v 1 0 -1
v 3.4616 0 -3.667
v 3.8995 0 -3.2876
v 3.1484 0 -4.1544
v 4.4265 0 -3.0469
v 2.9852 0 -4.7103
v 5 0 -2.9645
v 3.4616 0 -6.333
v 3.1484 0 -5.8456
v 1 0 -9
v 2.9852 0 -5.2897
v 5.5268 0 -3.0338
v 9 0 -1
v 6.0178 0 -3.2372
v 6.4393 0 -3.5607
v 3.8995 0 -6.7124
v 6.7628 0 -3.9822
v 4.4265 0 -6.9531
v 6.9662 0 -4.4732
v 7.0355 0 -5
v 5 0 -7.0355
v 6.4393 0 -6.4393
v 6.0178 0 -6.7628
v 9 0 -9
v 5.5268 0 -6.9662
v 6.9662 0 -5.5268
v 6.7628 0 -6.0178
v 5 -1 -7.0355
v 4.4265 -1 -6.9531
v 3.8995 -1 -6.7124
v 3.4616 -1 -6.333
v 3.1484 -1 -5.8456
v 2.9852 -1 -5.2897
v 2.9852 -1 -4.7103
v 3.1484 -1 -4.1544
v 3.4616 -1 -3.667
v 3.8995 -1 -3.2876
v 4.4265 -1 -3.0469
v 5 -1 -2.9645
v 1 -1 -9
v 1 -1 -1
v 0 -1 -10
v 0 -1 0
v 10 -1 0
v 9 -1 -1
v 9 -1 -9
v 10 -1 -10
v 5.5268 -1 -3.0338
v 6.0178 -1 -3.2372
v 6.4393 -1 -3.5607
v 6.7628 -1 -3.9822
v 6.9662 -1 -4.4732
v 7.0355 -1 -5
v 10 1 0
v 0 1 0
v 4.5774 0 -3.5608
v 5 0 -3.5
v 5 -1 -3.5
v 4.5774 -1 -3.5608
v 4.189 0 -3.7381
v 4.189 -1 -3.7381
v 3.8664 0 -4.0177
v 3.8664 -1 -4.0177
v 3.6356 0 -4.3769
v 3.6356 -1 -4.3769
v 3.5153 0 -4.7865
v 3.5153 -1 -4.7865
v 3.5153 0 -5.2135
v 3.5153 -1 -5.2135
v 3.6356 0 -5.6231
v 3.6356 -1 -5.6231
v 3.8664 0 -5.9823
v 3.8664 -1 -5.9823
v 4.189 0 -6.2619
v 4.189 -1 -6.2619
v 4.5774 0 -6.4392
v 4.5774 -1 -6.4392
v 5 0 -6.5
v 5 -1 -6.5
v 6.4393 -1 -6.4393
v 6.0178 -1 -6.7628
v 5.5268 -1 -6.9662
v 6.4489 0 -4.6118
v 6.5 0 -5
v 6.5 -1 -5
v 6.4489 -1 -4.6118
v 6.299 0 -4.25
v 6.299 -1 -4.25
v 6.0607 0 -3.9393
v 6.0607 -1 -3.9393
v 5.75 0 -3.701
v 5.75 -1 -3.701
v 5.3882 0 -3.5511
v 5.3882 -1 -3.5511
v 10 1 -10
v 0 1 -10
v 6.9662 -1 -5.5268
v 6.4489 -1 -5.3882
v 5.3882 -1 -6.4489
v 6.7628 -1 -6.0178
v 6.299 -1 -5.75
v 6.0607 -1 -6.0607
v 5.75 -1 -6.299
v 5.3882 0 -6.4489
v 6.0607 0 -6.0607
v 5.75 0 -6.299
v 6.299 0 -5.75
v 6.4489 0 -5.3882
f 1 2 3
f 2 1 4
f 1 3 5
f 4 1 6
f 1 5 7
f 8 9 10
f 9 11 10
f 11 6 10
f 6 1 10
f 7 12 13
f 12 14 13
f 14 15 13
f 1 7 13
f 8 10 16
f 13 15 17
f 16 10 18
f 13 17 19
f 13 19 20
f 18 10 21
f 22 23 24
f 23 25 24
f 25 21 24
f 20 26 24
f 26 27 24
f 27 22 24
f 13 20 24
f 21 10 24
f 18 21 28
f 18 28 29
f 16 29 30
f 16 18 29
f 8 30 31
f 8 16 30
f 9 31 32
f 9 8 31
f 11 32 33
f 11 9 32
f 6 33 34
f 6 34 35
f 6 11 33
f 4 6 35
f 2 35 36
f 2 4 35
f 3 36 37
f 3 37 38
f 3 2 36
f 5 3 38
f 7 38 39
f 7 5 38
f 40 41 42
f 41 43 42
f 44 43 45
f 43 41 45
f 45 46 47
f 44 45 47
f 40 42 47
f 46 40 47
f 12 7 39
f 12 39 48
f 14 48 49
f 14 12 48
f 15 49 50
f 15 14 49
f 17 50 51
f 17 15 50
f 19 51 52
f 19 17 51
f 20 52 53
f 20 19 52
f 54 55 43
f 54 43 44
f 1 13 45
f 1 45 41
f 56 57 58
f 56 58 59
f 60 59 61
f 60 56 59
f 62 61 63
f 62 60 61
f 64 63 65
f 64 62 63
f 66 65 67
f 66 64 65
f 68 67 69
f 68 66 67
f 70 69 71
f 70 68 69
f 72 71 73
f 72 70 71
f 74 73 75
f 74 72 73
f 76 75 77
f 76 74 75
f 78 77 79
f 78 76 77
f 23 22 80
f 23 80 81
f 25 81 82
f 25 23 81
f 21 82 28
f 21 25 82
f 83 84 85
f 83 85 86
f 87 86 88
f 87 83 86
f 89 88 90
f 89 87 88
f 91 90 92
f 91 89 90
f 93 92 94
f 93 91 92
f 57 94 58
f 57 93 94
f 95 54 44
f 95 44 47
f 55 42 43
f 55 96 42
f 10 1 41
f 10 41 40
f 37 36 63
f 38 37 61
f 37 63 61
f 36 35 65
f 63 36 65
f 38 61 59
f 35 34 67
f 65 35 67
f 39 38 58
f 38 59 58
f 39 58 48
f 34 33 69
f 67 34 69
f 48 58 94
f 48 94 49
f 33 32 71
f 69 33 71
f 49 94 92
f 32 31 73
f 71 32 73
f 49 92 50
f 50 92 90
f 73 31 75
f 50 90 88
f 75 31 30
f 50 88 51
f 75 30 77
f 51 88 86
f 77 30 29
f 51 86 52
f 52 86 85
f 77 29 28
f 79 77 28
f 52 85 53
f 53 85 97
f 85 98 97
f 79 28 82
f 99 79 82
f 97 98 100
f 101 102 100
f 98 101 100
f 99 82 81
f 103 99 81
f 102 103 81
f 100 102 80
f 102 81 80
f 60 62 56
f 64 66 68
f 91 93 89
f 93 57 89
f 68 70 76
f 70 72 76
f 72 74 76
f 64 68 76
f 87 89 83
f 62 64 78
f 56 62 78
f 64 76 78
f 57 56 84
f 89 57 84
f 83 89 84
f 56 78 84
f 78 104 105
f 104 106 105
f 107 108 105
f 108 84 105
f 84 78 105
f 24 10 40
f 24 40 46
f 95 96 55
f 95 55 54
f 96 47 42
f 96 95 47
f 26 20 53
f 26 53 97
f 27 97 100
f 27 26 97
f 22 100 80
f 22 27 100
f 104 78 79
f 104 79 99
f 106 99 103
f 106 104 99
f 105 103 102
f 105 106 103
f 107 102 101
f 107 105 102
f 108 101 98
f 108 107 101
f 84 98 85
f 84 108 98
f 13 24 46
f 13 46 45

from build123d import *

# Parameters (mm, degrees)
SKETCH1_W           = 10
SKETCH1_H           = 10
BOSS_EXTRUDE1_DEPTH = 1
SKETCH1_4_W         = 10
SKETCH1_4_H         = 10
SKETCH1_4_W_2       = 8
SKETCH1_4_H_2       = 8
SKETCH1_4_R         = 2.035533906
SKETCH1_4_R_2       = 1.5
BOSS_EXTRUDE3_DEPTH = 1


with BuildPart() as part:
    # Sketch1 → Boss-Extrude1 (new body)
    with BuildSketch(Plane(origin=(0, 0, 0), x_dir=(1, 0, 0), z_dir=(0, 1, 0))):
        with Locations((5, 5)):
            Rectangle(SKETCH1_W, SKETCH1_H)
    extrude(amount=BOSS_EXTRUDE1_DEPTH)

    # Sketch1<4> → Boss-Extrude3 (add)
    # profile 1 of 2: a face of its own
    with BuildSketch(Plane(origin=(0, 0, 0), x_dir=(1, 0, 0), z_dir=(0, 1, 0))):
        with Locations((5, 5)):
            Rectangle(SKETCH1_4_W, SKETCH1_4_H)
        with Locations((5, 5)):
            Rectangle(SKETCH1_4_W_2, SKETCH1_4_H_2, mode=Mode.SUBTRACT)
    # profile 2 of 2: a face of its own
    with BuildSketch(Plane(origin=(0, 0, 0), x_dir=(1, 0, 0), z_dir=(0, 1, 0))):
        with Locations((5, 5)):
            Circle(SKETCH1_4_R)
        with Locations((5, 5)):
            Circle(SKETCH1_4_R_2, mode=Mode.SUBTRACT)
    extrude(amount=-BOSS_EXTRUDE3_DEPTH)


solid = part.part
